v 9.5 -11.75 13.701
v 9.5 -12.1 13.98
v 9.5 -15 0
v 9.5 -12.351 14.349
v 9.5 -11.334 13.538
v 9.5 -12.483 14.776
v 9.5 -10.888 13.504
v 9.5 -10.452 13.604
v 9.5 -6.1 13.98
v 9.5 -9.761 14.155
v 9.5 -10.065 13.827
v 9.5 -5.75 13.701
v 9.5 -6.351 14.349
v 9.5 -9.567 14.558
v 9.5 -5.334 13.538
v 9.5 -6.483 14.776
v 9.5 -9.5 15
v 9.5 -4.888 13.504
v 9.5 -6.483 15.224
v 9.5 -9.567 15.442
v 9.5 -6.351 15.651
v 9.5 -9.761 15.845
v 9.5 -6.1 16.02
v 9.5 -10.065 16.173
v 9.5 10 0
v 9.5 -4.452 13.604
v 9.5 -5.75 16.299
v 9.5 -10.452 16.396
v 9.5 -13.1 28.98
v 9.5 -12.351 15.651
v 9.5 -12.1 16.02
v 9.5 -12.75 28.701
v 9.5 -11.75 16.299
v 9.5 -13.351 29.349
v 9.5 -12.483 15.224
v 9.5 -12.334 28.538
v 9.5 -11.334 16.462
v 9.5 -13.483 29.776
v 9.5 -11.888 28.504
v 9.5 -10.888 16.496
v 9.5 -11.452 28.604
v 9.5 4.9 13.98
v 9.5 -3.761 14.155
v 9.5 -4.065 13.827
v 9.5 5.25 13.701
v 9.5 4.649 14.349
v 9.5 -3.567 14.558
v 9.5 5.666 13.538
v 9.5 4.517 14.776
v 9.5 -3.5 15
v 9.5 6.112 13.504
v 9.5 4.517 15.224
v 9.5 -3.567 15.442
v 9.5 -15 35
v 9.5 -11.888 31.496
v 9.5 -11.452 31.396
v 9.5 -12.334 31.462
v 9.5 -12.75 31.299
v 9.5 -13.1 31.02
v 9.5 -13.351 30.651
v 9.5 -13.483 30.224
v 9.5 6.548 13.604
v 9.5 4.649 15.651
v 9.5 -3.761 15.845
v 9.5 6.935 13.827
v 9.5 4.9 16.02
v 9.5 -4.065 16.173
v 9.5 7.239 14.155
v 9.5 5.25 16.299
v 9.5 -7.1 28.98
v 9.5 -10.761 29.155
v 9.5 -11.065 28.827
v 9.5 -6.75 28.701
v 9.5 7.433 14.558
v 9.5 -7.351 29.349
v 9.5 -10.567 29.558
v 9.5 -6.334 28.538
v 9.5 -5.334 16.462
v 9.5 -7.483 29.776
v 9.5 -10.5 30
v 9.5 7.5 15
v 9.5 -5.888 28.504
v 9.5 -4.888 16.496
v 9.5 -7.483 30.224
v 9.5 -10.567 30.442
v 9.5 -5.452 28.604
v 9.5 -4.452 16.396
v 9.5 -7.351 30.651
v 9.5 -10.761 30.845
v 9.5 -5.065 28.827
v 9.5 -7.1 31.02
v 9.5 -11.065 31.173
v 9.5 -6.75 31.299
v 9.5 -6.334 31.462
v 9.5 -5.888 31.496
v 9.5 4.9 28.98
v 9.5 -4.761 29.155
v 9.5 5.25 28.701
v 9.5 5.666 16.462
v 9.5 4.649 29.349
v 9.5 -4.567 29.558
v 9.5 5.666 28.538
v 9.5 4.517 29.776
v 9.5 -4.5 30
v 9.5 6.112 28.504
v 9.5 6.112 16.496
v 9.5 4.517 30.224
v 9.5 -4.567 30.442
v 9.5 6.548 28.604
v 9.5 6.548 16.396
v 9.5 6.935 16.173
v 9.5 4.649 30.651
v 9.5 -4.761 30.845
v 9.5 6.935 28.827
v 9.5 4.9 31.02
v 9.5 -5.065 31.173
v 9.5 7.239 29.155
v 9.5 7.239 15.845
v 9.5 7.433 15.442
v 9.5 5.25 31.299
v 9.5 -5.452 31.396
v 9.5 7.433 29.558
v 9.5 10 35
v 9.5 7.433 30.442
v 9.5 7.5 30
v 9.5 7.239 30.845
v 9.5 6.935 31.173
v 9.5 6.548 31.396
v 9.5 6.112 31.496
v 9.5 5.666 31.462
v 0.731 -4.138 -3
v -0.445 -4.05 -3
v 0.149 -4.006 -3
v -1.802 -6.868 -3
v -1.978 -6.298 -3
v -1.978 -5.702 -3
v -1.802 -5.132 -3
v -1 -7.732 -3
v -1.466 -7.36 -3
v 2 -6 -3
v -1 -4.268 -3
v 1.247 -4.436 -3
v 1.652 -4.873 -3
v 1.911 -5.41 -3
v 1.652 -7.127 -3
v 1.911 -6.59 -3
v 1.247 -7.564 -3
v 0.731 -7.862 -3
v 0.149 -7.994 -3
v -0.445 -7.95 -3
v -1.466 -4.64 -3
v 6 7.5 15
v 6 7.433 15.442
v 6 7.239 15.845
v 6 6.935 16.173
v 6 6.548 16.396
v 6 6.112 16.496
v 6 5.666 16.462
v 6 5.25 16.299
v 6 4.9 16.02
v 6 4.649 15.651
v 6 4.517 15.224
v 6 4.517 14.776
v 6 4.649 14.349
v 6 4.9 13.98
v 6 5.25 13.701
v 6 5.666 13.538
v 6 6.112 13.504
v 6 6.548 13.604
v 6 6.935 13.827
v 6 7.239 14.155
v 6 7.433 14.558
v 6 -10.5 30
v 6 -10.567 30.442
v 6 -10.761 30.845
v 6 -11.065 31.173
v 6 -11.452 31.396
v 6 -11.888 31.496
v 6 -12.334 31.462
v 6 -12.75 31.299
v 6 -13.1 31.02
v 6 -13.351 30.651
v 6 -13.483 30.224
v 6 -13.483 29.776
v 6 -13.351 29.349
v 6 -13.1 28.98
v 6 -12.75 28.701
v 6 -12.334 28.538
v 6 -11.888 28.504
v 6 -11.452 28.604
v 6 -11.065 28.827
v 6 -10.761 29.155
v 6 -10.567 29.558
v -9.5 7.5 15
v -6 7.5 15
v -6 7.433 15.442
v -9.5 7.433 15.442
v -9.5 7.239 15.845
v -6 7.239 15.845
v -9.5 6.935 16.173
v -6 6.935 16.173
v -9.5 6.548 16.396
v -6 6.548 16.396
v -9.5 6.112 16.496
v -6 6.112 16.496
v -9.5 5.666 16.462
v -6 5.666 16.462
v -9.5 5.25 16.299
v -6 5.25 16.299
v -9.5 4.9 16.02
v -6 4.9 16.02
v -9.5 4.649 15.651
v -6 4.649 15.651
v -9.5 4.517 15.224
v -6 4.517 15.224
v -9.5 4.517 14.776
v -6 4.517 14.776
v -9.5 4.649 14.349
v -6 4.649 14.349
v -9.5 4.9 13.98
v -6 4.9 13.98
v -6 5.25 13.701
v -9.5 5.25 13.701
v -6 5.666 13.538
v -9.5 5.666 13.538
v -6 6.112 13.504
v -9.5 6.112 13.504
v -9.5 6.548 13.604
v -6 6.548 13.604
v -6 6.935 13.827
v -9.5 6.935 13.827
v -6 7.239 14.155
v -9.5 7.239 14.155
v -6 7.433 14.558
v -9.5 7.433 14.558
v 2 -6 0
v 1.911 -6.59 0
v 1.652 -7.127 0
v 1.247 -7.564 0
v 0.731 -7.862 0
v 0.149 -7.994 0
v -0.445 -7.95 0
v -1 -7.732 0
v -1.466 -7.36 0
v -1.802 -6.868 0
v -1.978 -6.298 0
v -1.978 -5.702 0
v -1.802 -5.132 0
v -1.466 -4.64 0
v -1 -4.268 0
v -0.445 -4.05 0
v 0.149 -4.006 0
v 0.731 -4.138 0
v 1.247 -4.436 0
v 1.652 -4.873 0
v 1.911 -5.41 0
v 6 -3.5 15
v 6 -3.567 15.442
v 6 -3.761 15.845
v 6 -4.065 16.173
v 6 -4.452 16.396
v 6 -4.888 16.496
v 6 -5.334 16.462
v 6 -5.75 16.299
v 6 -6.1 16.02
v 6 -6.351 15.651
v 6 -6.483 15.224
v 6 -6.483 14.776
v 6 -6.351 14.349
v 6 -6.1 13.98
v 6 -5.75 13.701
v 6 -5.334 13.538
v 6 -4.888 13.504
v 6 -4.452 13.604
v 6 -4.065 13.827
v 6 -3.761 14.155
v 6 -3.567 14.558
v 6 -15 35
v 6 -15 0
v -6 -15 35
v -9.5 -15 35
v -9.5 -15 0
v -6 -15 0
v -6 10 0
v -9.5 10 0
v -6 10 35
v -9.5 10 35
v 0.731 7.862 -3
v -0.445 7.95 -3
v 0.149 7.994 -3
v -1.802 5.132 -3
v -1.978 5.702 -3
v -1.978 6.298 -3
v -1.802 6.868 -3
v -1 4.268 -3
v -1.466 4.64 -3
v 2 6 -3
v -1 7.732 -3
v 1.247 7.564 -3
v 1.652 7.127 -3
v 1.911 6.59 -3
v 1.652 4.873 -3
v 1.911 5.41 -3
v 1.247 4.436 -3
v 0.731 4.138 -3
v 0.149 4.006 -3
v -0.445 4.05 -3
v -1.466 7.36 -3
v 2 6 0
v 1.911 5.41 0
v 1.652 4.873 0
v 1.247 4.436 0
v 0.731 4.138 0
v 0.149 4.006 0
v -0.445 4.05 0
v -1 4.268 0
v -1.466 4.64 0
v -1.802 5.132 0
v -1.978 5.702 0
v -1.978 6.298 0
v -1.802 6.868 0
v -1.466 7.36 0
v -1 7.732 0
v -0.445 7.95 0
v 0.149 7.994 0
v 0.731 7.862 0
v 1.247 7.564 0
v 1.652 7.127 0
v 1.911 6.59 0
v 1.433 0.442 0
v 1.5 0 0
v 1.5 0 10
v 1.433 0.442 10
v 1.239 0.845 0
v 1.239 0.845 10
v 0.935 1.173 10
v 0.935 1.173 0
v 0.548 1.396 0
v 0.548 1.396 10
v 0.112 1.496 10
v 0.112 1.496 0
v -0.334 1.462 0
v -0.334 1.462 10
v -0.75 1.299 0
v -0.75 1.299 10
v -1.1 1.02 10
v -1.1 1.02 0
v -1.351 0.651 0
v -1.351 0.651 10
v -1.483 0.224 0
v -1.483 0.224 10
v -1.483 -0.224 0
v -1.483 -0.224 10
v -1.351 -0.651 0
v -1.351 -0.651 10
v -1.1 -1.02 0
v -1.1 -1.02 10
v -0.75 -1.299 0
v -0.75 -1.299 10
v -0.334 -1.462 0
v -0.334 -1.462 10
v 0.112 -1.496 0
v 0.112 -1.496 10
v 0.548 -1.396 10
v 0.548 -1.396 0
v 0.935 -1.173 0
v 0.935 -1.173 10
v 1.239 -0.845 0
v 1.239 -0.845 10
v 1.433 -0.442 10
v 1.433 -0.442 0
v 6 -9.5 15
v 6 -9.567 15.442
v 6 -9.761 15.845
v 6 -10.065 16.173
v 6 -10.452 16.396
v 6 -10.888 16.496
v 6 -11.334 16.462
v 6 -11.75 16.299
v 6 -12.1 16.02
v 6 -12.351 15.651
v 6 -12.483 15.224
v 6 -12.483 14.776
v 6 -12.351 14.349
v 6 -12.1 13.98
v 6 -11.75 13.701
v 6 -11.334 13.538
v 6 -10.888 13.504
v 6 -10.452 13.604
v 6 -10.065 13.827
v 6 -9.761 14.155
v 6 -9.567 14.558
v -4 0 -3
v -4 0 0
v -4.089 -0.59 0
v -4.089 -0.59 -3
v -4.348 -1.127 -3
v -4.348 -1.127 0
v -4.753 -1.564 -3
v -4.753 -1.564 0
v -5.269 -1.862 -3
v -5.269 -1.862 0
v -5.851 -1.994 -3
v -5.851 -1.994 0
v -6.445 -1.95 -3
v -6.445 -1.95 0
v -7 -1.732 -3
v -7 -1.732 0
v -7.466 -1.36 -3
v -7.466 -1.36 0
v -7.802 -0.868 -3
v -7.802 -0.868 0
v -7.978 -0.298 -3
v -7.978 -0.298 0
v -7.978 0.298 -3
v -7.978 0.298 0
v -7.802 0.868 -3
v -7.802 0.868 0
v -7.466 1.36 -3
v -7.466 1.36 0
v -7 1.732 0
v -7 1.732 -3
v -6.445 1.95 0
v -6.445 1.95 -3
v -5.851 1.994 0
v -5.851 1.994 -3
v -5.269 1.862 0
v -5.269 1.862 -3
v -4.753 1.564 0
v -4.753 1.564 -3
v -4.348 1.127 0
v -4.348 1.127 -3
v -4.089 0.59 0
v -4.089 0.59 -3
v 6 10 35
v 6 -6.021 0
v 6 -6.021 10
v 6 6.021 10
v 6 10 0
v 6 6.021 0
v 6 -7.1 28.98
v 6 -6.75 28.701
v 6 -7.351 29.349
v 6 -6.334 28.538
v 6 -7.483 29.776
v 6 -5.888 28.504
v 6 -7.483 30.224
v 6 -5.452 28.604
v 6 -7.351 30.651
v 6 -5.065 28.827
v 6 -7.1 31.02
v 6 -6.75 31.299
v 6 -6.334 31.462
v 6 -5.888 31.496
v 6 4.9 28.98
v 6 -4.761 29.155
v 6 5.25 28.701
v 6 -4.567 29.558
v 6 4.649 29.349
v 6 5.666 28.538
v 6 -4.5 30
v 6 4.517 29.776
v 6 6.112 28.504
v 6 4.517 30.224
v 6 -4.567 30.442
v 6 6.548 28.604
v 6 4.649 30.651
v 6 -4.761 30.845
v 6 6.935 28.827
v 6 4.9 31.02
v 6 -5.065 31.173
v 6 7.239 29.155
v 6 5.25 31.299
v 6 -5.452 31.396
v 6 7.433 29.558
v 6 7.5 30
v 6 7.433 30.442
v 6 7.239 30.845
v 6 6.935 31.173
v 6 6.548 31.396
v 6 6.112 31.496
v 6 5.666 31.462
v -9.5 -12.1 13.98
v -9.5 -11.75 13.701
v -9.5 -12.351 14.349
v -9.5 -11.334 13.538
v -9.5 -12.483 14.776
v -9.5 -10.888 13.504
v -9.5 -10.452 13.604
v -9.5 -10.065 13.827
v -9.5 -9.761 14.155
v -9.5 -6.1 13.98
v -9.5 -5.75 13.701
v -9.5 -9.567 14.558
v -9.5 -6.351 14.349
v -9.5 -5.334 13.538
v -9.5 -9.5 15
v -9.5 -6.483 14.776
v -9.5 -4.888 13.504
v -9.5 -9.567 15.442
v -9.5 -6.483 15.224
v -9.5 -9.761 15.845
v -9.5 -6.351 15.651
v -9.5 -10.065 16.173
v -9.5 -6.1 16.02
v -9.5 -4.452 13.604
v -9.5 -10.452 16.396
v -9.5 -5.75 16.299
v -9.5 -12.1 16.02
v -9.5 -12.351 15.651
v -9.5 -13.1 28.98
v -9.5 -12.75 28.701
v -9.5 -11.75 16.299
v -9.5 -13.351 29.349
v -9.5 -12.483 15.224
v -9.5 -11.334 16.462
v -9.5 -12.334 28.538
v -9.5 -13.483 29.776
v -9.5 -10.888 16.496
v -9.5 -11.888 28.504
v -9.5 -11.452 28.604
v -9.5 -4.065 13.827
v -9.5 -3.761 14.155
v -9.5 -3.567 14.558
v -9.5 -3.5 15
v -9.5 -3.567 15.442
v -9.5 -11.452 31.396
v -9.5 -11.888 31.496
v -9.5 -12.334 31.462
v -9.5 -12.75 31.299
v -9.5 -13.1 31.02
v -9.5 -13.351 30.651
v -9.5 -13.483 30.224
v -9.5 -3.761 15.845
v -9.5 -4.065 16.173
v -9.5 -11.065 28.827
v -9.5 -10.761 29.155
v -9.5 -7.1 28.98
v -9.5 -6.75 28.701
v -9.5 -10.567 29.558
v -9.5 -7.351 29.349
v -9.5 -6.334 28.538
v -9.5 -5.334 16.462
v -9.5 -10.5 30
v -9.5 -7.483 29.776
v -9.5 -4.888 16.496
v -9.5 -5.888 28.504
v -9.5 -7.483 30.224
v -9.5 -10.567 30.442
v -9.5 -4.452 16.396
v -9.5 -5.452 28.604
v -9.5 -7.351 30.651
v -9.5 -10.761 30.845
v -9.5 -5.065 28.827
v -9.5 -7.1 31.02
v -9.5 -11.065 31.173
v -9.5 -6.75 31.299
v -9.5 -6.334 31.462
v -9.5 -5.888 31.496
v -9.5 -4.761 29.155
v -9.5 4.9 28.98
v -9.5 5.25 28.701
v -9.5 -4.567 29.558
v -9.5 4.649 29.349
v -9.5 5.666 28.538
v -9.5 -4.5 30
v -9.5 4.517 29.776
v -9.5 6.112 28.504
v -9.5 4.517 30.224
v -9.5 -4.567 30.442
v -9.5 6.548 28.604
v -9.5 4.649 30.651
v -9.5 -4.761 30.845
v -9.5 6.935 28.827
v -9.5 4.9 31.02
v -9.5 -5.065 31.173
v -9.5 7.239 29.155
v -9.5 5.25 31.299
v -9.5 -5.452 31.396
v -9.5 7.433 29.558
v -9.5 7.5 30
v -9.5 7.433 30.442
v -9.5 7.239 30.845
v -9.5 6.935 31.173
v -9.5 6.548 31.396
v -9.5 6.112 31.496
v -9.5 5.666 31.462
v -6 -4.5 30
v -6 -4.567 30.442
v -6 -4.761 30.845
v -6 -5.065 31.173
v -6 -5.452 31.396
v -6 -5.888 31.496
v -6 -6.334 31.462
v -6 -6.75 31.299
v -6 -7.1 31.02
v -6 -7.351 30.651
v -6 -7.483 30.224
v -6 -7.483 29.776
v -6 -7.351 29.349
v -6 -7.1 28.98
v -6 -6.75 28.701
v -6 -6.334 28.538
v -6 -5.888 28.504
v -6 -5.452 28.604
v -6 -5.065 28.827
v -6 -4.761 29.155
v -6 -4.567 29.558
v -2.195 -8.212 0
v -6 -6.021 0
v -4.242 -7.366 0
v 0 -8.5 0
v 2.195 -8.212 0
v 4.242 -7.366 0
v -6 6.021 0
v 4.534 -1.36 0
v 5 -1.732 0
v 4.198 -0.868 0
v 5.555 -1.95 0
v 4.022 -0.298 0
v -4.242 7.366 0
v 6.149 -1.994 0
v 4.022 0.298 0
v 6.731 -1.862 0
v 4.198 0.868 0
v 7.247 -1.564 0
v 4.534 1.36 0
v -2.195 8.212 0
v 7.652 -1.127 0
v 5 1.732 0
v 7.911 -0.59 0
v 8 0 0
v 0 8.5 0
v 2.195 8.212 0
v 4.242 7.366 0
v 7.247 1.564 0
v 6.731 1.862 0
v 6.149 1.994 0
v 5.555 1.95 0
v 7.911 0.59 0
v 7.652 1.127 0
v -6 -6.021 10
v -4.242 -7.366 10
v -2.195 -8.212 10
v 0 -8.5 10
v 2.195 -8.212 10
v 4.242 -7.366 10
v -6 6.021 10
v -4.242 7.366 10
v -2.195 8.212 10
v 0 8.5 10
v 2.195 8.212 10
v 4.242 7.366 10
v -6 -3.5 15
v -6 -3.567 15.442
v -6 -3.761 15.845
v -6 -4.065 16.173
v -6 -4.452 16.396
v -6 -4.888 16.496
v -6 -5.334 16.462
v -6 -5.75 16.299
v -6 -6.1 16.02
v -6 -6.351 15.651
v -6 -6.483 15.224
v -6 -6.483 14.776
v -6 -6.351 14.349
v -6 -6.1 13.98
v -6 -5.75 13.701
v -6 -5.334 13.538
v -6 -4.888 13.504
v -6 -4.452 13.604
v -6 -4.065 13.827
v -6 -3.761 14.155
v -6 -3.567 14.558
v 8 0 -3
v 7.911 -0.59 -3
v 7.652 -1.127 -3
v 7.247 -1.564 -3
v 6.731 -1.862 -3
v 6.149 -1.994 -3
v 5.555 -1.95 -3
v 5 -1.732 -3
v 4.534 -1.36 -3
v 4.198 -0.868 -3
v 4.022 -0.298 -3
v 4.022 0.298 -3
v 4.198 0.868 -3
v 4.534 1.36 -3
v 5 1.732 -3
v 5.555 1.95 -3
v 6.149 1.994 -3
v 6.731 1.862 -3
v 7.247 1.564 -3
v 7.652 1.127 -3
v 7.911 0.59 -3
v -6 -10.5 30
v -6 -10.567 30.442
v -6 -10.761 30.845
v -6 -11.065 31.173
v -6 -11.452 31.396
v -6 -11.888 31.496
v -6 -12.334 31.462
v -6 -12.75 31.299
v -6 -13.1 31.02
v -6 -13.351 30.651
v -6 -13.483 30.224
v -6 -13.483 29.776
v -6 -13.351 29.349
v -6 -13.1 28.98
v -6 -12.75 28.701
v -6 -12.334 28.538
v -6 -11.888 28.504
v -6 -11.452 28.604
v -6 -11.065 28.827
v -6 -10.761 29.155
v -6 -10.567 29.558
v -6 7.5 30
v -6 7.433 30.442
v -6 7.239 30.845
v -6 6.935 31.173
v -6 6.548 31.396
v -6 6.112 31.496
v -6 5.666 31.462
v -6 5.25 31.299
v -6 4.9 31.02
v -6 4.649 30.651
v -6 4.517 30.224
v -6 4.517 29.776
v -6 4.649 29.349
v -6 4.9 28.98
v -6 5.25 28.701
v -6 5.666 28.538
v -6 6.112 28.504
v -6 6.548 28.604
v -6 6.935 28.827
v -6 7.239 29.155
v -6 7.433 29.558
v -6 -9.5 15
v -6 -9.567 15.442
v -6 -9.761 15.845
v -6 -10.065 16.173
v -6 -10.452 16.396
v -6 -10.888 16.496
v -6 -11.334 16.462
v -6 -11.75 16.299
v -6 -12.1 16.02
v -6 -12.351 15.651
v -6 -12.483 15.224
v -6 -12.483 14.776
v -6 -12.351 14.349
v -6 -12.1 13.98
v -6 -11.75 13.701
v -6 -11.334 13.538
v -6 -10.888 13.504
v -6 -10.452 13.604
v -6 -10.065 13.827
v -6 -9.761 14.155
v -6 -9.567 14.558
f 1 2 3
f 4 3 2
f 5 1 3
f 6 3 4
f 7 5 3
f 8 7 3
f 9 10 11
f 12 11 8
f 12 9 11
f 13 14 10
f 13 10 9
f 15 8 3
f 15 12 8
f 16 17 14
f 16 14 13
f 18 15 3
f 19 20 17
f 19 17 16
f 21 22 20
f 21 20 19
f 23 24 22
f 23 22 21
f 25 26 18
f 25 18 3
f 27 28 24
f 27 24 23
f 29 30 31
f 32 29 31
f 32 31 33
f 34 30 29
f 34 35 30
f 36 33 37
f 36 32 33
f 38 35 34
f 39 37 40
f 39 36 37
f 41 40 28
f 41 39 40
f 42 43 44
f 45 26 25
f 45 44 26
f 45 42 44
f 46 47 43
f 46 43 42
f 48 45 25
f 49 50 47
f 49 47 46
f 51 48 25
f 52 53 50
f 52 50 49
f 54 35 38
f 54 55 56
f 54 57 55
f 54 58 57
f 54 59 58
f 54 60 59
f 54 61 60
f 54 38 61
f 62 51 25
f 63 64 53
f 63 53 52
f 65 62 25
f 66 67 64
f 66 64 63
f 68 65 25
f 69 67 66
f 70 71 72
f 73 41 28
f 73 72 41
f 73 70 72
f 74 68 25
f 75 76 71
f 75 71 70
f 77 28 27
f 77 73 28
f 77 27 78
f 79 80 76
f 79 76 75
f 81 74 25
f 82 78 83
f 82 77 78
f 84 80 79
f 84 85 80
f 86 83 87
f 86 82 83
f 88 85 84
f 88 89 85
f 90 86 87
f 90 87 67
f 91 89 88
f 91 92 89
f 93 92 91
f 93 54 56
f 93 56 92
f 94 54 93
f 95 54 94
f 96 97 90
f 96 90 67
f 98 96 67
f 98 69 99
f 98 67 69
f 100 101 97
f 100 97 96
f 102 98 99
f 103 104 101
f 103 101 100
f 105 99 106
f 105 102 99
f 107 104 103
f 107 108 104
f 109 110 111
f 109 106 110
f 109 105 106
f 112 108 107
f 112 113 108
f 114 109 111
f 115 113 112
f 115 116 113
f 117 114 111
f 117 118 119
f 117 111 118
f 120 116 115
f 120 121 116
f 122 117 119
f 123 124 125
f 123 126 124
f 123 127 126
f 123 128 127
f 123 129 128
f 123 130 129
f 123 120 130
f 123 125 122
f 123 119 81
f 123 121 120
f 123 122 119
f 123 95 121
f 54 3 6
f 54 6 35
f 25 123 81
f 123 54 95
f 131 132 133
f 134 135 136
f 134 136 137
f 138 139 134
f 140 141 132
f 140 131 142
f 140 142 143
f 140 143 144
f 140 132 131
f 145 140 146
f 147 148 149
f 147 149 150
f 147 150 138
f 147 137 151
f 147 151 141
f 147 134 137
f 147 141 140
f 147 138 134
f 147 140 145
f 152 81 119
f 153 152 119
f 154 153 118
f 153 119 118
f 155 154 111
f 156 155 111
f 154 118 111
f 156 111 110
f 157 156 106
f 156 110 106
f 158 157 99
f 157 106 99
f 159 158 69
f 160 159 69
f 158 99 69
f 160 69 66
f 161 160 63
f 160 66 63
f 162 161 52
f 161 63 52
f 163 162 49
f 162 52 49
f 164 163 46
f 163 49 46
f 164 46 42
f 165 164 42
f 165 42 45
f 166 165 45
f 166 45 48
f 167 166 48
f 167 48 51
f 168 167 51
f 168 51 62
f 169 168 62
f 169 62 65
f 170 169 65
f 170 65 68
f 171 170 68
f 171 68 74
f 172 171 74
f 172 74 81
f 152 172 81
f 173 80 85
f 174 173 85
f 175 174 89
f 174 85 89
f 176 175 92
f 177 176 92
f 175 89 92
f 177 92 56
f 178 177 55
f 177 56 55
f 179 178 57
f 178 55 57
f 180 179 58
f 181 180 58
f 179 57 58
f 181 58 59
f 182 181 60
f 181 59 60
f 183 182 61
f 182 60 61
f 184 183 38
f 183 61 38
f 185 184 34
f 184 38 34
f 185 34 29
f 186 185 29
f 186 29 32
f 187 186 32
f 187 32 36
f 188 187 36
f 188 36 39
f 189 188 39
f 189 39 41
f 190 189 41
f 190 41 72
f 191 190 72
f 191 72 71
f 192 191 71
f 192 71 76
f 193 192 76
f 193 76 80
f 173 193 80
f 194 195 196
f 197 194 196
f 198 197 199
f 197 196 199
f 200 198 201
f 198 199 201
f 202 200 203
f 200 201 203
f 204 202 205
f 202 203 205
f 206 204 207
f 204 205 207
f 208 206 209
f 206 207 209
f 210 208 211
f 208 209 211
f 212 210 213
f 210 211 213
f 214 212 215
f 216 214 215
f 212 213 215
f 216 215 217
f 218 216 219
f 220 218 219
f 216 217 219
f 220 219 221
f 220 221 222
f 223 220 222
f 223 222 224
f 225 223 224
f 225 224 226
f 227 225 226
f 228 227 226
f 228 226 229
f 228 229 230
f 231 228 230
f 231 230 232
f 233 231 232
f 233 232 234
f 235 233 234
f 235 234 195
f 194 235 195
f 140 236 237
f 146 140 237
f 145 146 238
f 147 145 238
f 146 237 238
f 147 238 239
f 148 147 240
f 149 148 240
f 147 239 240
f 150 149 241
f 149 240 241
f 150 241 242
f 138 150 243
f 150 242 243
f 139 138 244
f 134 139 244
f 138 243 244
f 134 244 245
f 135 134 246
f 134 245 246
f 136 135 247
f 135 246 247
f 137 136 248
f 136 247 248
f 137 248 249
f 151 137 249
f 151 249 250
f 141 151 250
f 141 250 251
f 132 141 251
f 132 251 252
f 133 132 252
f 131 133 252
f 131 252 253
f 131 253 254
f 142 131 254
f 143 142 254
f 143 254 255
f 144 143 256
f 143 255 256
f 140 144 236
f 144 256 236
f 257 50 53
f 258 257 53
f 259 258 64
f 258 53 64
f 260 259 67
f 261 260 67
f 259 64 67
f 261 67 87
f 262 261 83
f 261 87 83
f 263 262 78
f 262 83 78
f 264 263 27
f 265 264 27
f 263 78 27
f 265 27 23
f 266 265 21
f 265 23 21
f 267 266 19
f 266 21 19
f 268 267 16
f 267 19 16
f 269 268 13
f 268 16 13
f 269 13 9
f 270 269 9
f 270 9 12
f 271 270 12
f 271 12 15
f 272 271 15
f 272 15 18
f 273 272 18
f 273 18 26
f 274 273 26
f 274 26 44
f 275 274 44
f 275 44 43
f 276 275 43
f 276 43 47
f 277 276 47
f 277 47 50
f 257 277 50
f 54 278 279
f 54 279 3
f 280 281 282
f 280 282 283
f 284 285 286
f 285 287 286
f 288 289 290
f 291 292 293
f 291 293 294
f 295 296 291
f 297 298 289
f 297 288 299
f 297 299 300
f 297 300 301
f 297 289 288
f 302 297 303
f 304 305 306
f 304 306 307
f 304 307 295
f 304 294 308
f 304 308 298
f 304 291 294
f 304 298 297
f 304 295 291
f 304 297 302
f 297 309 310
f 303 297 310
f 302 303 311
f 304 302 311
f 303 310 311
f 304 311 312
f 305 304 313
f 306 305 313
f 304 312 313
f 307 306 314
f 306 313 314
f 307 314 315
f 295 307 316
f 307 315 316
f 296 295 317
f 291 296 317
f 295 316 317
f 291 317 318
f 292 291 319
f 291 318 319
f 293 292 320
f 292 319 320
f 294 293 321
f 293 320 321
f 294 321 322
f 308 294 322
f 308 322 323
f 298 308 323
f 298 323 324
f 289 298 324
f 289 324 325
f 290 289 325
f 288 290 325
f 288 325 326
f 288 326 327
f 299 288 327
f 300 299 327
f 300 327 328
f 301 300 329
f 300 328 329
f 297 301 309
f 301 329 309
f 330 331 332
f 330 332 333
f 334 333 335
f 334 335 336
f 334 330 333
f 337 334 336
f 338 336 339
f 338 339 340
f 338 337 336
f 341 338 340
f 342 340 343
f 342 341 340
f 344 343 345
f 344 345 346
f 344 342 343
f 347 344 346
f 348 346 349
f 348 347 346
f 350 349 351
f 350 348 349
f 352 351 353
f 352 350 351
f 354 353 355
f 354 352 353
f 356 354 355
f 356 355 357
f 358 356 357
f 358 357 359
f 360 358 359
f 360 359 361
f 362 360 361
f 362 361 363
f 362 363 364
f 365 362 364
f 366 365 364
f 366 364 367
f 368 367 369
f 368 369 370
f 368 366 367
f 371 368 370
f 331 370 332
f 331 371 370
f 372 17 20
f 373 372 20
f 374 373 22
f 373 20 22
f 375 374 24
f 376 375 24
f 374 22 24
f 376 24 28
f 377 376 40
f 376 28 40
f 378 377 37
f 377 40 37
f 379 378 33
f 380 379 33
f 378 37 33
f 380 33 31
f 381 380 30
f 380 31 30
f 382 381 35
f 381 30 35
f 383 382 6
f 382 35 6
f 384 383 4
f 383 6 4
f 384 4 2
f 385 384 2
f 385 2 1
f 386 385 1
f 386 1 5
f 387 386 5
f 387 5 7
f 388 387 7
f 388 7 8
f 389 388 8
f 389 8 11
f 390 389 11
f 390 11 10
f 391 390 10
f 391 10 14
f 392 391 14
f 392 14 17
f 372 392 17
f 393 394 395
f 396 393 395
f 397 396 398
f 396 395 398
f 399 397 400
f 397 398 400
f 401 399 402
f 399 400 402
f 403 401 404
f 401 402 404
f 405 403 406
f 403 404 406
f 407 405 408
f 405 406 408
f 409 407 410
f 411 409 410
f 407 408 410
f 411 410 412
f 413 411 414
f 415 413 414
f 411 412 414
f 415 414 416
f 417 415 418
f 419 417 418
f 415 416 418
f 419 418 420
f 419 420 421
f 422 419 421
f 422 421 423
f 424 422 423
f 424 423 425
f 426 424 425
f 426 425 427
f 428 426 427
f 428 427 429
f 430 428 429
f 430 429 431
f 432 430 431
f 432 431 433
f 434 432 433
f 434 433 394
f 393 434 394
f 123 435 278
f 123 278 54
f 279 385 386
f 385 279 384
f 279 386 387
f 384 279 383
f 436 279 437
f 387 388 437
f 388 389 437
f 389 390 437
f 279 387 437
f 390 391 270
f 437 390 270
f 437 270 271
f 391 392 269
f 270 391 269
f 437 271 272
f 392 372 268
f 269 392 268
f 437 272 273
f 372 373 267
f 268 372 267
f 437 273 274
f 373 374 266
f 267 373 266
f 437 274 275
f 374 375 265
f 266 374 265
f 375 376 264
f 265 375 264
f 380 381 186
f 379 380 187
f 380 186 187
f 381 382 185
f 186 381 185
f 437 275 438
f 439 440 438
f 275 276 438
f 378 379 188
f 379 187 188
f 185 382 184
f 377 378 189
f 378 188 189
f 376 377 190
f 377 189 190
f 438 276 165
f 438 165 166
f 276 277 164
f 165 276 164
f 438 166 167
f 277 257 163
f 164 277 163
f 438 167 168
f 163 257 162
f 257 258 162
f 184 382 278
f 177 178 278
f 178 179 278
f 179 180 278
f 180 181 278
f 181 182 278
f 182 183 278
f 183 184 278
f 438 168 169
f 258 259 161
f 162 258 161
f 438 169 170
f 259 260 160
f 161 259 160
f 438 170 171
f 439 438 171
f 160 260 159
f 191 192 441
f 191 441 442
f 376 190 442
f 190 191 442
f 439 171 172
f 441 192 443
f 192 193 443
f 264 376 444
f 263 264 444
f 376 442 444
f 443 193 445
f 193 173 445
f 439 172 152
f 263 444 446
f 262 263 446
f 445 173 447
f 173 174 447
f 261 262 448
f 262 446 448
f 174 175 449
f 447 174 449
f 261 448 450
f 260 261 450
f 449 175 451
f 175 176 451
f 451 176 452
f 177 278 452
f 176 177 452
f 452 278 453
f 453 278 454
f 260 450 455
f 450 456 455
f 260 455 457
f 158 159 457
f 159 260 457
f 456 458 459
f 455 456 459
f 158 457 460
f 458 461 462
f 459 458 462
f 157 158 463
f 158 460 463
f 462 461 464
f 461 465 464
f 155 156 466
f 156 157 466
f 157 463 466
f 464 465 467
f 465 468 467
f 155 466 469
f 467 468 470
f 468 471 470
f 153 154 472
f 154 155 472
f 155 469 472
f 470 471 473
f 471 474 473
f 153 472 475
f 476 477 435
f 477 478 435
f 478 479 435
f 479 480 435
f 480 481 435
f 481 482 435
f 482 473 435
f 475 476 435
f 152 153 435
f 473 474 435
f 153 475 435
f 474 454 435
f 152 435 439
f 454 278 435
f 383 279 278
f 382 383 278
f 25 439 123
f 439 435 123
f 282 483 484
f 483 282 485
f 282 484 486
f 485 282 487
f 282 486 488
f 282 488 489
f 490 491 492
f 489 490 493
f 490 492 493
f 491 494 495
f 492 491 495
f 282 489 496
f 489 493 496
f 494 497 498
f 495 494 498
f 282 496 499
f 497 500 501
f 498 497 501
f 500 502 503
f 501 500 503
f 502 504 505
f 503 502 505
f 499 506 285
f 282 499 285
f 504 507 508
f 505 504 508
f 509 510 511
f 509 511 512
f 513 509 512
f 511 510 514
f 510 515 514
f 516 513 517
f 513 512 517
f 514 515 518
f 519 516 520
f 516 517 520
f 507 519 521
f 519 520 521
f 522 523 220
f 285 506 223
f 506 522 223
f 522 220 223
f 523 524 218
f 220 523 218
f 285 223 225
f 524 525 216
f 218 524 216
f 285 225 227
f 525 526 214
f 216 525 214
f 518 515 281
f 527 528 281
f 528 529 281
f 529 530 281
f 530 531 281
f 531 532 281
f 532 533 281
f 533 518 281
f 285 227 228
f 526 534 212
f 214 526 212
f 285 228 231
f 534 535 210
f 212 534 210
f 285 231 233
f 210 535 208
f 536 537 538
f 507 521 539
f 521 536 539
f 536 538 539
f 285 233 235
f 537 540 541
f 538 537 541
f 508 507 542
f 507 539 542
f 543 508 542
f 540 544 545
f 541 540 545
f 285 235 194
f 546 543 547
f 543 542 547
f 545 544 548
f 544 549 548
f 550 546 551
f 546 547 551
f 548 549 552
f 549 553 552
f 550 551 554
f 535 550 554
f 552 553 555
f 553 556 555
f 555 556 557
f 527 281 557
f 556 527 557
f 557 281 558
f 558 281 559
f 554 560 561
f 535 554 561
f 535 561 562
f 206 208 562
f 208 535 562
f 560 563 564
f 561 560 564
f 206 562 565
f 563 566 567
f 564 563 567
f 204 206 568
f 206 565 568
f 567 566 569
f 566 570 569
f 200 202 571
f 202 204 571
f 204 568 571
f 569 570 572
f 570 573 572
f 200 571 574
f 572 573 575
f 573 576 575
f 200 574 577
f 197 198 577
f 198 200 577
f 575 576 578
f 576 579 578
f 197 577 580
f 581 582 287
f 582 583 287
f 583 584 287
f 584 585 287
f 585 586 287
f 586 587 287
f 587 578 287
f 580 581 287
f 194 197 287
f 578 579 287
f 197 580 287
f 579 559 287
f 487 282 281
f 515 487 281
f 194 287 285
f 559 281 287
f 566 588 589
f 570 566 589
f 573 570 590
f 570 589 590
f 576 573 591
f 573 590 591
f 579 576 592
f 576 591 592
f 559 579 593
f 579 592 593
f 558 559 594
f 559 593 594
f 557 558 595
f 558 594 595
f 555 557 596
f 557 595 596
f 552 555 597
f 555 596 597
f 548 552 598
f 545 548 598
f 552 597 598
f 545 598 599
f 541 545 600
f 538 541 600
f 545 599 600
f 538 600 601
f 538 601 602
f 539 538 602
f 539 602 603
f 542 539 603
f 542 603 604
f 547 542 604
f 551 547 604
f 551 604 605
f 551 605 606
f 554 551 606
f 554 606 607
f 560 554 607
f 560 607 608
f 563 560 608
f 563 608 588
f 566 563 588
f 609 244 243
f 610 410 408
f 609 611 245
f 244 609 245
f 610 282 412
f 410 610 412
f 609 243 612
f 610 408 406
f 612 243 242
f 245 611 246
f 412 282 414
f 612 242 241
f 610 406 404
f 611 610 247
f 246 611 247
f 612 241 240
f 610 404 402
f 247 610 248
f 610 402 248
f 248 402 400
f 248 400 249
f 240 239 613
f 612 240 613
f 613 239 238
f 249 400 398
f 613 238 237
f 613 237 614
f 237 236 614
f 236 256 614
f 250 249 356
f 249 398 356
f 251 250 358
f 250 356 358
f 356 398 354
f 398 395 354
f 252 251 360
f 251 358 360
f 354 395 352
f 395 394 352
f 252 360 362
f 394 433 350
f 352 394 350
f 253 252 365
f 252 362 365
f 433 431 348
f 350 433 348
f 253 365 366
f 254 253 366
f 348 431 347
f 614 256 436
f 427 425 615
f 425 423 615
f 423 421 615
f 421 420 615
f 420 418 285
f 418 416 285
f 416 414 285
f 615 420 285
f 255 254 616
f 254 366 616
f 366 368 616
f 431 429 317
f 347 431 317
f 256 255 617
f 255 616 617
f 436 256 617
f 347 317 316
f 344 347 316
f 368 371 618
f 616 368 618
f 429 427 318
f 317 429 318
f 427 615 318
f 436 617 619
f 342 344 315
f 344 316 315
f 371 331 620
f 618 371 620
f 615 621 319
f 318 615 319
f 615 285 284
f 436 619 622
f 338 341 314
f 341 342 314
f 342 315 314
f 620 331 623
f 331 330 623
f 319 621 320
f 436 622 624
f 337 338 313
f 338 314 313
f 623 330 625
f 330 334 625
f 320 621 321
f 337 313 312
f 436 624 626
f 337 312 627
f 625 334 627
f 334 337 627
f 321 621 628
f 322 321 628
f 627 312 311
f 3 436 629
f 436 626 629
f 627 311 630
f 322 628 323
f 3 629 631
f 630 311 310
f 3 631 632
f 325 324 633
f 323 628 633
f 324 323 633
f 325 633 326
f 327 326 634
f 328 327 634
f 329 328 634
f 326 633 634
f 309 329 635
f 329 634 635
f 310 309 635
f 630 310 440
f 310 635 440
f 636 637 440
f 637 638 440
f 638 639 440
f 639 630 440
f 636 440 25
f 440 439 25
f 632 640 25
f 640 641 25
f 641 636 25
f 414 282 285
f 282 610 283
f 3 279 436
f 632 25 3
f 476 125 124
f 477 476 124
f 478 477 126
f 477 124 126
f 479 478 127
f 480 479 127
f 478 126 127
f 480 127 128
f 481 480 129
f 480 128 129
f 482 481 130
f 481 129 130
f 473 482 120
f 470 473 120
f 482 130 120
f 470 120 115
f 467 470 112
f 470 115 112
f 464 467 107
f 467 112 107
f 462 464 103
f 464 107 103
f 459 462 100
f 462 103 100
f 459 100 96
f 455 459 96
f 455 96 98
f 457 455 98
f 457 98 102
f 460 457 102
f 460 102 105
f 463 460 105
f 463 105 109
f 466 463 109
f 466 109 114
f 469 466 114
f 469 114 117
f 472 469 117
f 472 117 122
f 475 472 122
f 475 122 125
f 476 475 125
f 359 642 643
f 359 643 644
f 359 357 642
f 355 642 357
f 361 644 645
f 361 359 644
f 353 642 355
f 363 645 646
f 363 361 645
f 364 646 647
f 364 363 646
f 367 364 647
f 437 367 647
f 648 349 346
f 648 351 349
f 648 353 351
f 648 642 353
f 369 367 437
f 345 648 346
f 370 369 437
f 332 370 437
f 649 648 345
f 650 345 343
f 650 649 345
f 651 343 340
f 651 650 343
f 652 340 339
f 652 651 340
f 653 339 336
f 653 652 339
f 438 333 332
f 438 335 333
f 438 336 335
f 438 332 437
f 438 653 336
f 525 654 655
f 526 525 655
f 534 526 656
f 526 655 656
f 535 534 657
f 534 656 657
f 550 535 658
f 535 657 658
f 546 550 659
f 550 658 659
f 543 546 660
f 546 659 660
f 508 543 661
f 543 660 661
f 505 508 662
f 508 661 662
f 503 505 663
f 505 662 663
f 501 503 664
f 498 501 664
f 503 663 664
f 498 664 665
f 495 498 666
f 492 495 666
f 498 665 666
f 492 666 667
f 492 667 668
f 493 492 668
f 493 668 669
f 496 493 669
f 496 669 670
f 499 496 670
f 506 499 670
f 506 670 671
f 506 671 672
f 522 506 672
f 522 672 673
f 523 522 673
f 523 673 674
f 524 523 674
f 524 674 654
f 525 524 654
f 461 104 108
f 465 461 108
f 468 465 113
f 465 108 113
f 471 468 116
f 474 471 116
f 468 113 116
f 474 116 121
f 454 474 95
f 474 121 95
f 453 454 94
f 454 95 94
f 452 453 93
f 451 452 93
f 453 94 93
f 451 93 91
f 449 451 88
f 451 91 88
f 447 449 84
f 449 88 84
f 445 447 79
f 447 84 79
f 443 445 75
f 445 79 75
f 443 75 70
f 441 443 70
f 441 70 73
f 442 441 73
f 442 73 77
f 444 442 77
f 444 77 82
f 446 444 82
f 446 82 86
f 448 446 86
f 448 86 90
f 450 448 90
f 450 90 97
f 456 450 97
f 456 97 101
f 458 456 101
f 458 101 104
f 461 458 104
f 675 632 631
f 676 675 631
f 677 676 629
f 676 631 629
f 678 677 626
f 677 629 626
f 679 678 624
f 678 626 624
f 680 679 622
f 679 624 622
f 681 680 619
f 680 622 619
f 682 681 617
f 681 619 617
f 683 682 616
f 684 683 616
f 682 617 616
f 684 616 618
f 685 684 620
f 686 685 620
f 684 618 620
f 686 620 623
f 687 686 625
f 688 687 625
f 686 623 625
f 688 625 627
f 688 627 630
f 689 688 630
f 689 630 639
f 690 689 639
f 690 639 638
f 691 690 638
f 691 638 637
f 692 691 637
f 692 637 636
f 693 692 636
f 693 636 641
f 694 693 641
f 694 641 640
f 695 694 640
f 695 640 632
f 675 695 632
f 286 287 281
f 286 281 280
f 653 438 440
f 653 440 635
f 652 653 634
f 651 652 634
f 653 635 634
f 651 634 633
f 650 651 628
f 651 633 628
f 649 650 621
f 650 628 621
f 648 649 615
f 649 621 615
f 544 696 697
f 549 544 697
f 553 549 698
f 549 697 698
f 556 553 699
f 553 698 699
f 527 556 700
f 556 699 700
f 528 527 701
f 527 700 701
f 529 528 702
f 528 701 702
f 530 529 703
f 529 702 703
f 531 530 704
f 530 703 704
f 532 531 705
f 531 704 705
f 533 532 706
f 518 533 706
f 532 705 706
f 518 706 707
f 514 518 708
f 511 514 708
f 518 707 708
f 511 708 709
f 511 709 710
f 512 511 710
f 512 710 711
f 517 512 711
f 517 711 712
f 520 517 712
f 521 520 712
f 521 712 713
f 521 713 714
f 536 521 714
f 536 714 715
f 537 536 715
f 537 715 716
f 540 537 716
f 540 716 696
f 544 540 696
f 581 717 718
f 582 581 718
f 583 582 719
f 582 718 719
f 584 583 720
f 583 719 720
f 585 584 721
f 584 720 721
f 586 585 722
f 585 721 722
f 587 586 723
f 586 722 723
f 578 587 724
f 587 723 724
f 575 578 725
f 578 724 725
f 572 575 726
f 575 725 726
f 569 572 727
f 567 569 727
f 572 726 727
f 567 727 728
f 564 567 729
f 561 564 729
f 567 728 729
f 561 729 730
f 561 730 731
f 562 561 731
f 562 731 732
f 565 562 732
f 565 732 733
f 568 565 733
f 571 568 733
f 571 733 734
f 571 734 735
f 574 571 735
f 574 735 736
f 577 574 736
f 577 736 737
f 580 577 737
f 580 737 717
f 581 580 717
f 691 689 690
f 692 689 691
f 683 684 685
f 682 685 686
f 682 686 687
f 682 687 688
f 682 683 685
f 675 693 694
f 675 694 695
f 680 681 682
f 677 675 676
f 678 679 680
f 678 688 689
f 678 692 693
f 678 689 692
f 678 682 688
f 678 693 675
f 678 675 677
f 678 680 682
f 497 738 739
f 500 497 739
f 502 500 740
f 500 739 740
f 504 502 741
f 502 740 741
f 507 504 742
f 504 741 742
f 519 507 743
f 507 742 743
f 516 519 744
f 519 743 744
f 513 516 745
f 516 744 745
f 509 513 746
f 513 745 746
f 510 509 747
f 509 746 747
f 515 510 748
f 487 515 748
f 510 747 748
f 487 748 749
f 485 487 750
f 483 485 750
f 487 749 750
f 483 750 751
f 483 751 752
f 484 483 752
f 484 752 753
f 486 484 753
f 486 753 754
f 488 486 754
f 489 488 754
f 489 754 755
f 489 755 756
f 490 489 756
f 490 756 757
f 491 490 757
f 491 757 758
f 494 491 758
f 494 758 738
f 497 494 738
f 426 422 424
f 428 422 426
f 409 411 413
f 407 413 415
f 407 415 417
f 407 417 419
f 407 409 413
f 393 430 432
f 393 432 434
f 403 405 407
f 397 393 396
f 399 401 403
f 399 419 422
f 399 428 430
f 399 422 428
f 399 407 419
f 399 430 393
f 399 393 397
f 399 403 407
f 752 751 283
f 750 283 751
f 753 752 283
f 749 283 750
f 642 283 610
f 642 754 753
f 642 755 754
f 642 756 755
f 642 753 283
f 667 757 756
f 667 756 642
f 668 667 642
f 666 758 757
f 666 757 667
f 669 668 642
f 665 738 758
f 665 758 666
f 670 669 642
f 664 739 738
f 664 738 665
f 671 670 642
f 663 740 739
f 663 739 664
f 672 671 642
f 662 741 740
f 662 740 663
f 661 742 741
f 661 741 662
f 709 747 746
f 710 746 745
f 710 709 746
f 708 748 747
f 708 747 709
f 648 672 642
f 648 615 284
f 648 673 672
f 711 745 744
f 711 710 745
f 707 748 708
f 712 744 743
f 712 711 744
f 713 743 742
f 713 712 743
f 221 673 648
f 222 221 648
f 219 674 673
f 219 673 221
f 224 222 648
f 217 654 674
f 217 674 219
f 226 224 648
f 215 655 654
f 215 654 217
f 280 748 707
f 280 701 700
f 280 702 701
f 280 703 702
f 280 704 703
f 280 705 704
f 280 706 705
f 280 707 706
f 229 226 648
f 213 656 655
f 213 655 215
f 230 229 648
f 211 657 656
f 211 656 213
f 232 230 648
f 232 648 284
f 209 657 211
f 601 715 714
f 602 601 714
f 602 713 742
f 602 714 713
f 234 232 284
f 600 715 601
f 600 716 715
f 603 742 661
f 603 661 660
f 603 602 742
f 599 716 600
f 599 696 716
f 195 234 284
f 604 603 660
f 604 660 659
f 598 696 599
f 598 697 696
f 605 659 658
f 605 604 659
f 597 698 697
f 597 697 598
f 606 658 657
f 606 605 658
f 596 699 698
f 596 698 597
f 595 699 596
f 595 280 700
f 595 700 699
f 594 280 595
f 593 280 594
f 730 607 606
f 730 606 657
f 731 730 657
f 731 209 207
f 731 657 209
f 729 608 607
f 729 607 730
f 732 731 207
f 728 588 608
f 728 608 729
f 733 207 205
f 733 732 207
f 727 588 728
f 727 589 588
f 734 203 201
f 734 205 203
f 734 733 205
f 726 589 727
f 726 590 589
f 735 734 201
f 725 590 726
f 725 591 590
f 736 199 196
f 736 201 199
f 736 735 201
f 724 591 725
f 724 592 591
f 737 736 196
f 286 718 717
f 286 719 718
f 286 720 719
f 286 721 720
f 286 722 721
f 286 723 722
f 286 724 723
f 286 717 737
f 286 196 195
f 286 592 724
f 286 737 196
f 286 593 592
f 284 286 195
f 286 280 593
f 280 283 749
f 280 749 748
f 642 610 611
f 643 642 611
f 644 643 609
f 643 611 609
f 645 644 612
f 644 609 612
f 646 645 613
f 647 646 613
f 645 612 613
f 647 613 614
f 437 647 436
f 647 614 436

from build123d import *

# Parameters (mm, degrees)
SKETCH_R          = 8.5
SKETCH_R_2        = 1.5
PAD_DEPTH         = 10
SKETCH001_R       = 2
PAD001_DEPTH      = 3
SKETCH002_W       = 3.5
SKETCH002_H       = 25
PAD002_DEPTH      = 25
PAD002_DEPTH_BACK = 10
SKETCH003_R       = 1.5
POCKET_DEPTH      = 19.001


with BuildPart() as part:
    # Sketch → Pad (new body)
    with BuildSketch(Plane.XY):
        Circle(SKETCH_R)
        Circle(SKETCH_R_2, mode=Mode.SUBTRACT)
    extrude(amount=PAD_DEPTH)

    # Sketch001 → Pad001 (new body)
    with BuildSketch(Plane(origin=(0, 0, 0), x_dir=(1, 0, 0), z_dir=(0, 0, -1))):
        with Locations((0, -6)):
            Circle(SKETCH001_R)
        with Locations((6, 0)):
            Circle(SKETCH001_R)
        with Locations((0, 6)):
            Circle(SKETCH001_R)
        with Locations((-6, 0)):
            Circle(SKETCH001_R)
    extrude(amount=PAD001_DEPTH)

    # Sketch002 → Pad002 (new body, two sides)
    with BuildSketch(Plane.XY.offset(10)) as pad002_sk:
        with Locations((-7.75, -2.5)):
            Rectangle(SKETCH002_W, SKETCH002_H)
        with Locations((7.75, -2.5)):
            Rectangle(SKETCH002_W, SKETCH002_H)
    extrude(amount=PAD002_DEPTH)
    extrude(pad002_sk.sketch, amount=-PAD002_DEPTH_BACK)

    # Sketch003 → Pocket (cut, through all)
    with BuildSketch(Plane.YZ.offset(9.5)):
        with Locations((-11, 15)):
            Circle(SKETCH003_R)
        with Locations((-5, 15)):
            Circle(SKETCH003_R)
        with Locations((-12, 30)):
            Circle(SKETCH003_R)
        with Locations((-6, 30)):
            Circle(SKETCH003_R)
        with Locations((6, 30)):
            Circle(SKETCH003_R)
        with Locations((6, 15)):
            Circle(SKETCH003_R)
    extrude(amount=-POCKET_DEPTH, mode=Mode.SUBTRACT)


solid = part.part
